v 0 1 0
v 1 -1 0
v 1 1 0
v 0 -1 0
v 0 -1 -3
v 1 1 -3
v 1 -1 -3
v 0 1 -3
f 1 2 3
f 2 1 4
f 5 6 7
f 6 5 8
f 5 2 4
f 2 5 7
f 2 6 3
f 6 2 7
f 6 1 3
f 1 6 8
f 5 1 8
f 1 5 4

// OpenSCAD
AlignedCube([1, 2, 3], alignment = [-1, 0, 1]);

module AlignedCube(dim, alignment) {
    translate(array_mul(dim, [-.5,-.5,-.5], alignment)) cube(dim, true);
    
    function array_mul(a, b, c, d, e) = (c != undef)
        ? array_mul(array_mul(a, b), c, d, e)
        : [for(n=[0:min(len(a),len(b))-1])a[n]*b[n]];
}
